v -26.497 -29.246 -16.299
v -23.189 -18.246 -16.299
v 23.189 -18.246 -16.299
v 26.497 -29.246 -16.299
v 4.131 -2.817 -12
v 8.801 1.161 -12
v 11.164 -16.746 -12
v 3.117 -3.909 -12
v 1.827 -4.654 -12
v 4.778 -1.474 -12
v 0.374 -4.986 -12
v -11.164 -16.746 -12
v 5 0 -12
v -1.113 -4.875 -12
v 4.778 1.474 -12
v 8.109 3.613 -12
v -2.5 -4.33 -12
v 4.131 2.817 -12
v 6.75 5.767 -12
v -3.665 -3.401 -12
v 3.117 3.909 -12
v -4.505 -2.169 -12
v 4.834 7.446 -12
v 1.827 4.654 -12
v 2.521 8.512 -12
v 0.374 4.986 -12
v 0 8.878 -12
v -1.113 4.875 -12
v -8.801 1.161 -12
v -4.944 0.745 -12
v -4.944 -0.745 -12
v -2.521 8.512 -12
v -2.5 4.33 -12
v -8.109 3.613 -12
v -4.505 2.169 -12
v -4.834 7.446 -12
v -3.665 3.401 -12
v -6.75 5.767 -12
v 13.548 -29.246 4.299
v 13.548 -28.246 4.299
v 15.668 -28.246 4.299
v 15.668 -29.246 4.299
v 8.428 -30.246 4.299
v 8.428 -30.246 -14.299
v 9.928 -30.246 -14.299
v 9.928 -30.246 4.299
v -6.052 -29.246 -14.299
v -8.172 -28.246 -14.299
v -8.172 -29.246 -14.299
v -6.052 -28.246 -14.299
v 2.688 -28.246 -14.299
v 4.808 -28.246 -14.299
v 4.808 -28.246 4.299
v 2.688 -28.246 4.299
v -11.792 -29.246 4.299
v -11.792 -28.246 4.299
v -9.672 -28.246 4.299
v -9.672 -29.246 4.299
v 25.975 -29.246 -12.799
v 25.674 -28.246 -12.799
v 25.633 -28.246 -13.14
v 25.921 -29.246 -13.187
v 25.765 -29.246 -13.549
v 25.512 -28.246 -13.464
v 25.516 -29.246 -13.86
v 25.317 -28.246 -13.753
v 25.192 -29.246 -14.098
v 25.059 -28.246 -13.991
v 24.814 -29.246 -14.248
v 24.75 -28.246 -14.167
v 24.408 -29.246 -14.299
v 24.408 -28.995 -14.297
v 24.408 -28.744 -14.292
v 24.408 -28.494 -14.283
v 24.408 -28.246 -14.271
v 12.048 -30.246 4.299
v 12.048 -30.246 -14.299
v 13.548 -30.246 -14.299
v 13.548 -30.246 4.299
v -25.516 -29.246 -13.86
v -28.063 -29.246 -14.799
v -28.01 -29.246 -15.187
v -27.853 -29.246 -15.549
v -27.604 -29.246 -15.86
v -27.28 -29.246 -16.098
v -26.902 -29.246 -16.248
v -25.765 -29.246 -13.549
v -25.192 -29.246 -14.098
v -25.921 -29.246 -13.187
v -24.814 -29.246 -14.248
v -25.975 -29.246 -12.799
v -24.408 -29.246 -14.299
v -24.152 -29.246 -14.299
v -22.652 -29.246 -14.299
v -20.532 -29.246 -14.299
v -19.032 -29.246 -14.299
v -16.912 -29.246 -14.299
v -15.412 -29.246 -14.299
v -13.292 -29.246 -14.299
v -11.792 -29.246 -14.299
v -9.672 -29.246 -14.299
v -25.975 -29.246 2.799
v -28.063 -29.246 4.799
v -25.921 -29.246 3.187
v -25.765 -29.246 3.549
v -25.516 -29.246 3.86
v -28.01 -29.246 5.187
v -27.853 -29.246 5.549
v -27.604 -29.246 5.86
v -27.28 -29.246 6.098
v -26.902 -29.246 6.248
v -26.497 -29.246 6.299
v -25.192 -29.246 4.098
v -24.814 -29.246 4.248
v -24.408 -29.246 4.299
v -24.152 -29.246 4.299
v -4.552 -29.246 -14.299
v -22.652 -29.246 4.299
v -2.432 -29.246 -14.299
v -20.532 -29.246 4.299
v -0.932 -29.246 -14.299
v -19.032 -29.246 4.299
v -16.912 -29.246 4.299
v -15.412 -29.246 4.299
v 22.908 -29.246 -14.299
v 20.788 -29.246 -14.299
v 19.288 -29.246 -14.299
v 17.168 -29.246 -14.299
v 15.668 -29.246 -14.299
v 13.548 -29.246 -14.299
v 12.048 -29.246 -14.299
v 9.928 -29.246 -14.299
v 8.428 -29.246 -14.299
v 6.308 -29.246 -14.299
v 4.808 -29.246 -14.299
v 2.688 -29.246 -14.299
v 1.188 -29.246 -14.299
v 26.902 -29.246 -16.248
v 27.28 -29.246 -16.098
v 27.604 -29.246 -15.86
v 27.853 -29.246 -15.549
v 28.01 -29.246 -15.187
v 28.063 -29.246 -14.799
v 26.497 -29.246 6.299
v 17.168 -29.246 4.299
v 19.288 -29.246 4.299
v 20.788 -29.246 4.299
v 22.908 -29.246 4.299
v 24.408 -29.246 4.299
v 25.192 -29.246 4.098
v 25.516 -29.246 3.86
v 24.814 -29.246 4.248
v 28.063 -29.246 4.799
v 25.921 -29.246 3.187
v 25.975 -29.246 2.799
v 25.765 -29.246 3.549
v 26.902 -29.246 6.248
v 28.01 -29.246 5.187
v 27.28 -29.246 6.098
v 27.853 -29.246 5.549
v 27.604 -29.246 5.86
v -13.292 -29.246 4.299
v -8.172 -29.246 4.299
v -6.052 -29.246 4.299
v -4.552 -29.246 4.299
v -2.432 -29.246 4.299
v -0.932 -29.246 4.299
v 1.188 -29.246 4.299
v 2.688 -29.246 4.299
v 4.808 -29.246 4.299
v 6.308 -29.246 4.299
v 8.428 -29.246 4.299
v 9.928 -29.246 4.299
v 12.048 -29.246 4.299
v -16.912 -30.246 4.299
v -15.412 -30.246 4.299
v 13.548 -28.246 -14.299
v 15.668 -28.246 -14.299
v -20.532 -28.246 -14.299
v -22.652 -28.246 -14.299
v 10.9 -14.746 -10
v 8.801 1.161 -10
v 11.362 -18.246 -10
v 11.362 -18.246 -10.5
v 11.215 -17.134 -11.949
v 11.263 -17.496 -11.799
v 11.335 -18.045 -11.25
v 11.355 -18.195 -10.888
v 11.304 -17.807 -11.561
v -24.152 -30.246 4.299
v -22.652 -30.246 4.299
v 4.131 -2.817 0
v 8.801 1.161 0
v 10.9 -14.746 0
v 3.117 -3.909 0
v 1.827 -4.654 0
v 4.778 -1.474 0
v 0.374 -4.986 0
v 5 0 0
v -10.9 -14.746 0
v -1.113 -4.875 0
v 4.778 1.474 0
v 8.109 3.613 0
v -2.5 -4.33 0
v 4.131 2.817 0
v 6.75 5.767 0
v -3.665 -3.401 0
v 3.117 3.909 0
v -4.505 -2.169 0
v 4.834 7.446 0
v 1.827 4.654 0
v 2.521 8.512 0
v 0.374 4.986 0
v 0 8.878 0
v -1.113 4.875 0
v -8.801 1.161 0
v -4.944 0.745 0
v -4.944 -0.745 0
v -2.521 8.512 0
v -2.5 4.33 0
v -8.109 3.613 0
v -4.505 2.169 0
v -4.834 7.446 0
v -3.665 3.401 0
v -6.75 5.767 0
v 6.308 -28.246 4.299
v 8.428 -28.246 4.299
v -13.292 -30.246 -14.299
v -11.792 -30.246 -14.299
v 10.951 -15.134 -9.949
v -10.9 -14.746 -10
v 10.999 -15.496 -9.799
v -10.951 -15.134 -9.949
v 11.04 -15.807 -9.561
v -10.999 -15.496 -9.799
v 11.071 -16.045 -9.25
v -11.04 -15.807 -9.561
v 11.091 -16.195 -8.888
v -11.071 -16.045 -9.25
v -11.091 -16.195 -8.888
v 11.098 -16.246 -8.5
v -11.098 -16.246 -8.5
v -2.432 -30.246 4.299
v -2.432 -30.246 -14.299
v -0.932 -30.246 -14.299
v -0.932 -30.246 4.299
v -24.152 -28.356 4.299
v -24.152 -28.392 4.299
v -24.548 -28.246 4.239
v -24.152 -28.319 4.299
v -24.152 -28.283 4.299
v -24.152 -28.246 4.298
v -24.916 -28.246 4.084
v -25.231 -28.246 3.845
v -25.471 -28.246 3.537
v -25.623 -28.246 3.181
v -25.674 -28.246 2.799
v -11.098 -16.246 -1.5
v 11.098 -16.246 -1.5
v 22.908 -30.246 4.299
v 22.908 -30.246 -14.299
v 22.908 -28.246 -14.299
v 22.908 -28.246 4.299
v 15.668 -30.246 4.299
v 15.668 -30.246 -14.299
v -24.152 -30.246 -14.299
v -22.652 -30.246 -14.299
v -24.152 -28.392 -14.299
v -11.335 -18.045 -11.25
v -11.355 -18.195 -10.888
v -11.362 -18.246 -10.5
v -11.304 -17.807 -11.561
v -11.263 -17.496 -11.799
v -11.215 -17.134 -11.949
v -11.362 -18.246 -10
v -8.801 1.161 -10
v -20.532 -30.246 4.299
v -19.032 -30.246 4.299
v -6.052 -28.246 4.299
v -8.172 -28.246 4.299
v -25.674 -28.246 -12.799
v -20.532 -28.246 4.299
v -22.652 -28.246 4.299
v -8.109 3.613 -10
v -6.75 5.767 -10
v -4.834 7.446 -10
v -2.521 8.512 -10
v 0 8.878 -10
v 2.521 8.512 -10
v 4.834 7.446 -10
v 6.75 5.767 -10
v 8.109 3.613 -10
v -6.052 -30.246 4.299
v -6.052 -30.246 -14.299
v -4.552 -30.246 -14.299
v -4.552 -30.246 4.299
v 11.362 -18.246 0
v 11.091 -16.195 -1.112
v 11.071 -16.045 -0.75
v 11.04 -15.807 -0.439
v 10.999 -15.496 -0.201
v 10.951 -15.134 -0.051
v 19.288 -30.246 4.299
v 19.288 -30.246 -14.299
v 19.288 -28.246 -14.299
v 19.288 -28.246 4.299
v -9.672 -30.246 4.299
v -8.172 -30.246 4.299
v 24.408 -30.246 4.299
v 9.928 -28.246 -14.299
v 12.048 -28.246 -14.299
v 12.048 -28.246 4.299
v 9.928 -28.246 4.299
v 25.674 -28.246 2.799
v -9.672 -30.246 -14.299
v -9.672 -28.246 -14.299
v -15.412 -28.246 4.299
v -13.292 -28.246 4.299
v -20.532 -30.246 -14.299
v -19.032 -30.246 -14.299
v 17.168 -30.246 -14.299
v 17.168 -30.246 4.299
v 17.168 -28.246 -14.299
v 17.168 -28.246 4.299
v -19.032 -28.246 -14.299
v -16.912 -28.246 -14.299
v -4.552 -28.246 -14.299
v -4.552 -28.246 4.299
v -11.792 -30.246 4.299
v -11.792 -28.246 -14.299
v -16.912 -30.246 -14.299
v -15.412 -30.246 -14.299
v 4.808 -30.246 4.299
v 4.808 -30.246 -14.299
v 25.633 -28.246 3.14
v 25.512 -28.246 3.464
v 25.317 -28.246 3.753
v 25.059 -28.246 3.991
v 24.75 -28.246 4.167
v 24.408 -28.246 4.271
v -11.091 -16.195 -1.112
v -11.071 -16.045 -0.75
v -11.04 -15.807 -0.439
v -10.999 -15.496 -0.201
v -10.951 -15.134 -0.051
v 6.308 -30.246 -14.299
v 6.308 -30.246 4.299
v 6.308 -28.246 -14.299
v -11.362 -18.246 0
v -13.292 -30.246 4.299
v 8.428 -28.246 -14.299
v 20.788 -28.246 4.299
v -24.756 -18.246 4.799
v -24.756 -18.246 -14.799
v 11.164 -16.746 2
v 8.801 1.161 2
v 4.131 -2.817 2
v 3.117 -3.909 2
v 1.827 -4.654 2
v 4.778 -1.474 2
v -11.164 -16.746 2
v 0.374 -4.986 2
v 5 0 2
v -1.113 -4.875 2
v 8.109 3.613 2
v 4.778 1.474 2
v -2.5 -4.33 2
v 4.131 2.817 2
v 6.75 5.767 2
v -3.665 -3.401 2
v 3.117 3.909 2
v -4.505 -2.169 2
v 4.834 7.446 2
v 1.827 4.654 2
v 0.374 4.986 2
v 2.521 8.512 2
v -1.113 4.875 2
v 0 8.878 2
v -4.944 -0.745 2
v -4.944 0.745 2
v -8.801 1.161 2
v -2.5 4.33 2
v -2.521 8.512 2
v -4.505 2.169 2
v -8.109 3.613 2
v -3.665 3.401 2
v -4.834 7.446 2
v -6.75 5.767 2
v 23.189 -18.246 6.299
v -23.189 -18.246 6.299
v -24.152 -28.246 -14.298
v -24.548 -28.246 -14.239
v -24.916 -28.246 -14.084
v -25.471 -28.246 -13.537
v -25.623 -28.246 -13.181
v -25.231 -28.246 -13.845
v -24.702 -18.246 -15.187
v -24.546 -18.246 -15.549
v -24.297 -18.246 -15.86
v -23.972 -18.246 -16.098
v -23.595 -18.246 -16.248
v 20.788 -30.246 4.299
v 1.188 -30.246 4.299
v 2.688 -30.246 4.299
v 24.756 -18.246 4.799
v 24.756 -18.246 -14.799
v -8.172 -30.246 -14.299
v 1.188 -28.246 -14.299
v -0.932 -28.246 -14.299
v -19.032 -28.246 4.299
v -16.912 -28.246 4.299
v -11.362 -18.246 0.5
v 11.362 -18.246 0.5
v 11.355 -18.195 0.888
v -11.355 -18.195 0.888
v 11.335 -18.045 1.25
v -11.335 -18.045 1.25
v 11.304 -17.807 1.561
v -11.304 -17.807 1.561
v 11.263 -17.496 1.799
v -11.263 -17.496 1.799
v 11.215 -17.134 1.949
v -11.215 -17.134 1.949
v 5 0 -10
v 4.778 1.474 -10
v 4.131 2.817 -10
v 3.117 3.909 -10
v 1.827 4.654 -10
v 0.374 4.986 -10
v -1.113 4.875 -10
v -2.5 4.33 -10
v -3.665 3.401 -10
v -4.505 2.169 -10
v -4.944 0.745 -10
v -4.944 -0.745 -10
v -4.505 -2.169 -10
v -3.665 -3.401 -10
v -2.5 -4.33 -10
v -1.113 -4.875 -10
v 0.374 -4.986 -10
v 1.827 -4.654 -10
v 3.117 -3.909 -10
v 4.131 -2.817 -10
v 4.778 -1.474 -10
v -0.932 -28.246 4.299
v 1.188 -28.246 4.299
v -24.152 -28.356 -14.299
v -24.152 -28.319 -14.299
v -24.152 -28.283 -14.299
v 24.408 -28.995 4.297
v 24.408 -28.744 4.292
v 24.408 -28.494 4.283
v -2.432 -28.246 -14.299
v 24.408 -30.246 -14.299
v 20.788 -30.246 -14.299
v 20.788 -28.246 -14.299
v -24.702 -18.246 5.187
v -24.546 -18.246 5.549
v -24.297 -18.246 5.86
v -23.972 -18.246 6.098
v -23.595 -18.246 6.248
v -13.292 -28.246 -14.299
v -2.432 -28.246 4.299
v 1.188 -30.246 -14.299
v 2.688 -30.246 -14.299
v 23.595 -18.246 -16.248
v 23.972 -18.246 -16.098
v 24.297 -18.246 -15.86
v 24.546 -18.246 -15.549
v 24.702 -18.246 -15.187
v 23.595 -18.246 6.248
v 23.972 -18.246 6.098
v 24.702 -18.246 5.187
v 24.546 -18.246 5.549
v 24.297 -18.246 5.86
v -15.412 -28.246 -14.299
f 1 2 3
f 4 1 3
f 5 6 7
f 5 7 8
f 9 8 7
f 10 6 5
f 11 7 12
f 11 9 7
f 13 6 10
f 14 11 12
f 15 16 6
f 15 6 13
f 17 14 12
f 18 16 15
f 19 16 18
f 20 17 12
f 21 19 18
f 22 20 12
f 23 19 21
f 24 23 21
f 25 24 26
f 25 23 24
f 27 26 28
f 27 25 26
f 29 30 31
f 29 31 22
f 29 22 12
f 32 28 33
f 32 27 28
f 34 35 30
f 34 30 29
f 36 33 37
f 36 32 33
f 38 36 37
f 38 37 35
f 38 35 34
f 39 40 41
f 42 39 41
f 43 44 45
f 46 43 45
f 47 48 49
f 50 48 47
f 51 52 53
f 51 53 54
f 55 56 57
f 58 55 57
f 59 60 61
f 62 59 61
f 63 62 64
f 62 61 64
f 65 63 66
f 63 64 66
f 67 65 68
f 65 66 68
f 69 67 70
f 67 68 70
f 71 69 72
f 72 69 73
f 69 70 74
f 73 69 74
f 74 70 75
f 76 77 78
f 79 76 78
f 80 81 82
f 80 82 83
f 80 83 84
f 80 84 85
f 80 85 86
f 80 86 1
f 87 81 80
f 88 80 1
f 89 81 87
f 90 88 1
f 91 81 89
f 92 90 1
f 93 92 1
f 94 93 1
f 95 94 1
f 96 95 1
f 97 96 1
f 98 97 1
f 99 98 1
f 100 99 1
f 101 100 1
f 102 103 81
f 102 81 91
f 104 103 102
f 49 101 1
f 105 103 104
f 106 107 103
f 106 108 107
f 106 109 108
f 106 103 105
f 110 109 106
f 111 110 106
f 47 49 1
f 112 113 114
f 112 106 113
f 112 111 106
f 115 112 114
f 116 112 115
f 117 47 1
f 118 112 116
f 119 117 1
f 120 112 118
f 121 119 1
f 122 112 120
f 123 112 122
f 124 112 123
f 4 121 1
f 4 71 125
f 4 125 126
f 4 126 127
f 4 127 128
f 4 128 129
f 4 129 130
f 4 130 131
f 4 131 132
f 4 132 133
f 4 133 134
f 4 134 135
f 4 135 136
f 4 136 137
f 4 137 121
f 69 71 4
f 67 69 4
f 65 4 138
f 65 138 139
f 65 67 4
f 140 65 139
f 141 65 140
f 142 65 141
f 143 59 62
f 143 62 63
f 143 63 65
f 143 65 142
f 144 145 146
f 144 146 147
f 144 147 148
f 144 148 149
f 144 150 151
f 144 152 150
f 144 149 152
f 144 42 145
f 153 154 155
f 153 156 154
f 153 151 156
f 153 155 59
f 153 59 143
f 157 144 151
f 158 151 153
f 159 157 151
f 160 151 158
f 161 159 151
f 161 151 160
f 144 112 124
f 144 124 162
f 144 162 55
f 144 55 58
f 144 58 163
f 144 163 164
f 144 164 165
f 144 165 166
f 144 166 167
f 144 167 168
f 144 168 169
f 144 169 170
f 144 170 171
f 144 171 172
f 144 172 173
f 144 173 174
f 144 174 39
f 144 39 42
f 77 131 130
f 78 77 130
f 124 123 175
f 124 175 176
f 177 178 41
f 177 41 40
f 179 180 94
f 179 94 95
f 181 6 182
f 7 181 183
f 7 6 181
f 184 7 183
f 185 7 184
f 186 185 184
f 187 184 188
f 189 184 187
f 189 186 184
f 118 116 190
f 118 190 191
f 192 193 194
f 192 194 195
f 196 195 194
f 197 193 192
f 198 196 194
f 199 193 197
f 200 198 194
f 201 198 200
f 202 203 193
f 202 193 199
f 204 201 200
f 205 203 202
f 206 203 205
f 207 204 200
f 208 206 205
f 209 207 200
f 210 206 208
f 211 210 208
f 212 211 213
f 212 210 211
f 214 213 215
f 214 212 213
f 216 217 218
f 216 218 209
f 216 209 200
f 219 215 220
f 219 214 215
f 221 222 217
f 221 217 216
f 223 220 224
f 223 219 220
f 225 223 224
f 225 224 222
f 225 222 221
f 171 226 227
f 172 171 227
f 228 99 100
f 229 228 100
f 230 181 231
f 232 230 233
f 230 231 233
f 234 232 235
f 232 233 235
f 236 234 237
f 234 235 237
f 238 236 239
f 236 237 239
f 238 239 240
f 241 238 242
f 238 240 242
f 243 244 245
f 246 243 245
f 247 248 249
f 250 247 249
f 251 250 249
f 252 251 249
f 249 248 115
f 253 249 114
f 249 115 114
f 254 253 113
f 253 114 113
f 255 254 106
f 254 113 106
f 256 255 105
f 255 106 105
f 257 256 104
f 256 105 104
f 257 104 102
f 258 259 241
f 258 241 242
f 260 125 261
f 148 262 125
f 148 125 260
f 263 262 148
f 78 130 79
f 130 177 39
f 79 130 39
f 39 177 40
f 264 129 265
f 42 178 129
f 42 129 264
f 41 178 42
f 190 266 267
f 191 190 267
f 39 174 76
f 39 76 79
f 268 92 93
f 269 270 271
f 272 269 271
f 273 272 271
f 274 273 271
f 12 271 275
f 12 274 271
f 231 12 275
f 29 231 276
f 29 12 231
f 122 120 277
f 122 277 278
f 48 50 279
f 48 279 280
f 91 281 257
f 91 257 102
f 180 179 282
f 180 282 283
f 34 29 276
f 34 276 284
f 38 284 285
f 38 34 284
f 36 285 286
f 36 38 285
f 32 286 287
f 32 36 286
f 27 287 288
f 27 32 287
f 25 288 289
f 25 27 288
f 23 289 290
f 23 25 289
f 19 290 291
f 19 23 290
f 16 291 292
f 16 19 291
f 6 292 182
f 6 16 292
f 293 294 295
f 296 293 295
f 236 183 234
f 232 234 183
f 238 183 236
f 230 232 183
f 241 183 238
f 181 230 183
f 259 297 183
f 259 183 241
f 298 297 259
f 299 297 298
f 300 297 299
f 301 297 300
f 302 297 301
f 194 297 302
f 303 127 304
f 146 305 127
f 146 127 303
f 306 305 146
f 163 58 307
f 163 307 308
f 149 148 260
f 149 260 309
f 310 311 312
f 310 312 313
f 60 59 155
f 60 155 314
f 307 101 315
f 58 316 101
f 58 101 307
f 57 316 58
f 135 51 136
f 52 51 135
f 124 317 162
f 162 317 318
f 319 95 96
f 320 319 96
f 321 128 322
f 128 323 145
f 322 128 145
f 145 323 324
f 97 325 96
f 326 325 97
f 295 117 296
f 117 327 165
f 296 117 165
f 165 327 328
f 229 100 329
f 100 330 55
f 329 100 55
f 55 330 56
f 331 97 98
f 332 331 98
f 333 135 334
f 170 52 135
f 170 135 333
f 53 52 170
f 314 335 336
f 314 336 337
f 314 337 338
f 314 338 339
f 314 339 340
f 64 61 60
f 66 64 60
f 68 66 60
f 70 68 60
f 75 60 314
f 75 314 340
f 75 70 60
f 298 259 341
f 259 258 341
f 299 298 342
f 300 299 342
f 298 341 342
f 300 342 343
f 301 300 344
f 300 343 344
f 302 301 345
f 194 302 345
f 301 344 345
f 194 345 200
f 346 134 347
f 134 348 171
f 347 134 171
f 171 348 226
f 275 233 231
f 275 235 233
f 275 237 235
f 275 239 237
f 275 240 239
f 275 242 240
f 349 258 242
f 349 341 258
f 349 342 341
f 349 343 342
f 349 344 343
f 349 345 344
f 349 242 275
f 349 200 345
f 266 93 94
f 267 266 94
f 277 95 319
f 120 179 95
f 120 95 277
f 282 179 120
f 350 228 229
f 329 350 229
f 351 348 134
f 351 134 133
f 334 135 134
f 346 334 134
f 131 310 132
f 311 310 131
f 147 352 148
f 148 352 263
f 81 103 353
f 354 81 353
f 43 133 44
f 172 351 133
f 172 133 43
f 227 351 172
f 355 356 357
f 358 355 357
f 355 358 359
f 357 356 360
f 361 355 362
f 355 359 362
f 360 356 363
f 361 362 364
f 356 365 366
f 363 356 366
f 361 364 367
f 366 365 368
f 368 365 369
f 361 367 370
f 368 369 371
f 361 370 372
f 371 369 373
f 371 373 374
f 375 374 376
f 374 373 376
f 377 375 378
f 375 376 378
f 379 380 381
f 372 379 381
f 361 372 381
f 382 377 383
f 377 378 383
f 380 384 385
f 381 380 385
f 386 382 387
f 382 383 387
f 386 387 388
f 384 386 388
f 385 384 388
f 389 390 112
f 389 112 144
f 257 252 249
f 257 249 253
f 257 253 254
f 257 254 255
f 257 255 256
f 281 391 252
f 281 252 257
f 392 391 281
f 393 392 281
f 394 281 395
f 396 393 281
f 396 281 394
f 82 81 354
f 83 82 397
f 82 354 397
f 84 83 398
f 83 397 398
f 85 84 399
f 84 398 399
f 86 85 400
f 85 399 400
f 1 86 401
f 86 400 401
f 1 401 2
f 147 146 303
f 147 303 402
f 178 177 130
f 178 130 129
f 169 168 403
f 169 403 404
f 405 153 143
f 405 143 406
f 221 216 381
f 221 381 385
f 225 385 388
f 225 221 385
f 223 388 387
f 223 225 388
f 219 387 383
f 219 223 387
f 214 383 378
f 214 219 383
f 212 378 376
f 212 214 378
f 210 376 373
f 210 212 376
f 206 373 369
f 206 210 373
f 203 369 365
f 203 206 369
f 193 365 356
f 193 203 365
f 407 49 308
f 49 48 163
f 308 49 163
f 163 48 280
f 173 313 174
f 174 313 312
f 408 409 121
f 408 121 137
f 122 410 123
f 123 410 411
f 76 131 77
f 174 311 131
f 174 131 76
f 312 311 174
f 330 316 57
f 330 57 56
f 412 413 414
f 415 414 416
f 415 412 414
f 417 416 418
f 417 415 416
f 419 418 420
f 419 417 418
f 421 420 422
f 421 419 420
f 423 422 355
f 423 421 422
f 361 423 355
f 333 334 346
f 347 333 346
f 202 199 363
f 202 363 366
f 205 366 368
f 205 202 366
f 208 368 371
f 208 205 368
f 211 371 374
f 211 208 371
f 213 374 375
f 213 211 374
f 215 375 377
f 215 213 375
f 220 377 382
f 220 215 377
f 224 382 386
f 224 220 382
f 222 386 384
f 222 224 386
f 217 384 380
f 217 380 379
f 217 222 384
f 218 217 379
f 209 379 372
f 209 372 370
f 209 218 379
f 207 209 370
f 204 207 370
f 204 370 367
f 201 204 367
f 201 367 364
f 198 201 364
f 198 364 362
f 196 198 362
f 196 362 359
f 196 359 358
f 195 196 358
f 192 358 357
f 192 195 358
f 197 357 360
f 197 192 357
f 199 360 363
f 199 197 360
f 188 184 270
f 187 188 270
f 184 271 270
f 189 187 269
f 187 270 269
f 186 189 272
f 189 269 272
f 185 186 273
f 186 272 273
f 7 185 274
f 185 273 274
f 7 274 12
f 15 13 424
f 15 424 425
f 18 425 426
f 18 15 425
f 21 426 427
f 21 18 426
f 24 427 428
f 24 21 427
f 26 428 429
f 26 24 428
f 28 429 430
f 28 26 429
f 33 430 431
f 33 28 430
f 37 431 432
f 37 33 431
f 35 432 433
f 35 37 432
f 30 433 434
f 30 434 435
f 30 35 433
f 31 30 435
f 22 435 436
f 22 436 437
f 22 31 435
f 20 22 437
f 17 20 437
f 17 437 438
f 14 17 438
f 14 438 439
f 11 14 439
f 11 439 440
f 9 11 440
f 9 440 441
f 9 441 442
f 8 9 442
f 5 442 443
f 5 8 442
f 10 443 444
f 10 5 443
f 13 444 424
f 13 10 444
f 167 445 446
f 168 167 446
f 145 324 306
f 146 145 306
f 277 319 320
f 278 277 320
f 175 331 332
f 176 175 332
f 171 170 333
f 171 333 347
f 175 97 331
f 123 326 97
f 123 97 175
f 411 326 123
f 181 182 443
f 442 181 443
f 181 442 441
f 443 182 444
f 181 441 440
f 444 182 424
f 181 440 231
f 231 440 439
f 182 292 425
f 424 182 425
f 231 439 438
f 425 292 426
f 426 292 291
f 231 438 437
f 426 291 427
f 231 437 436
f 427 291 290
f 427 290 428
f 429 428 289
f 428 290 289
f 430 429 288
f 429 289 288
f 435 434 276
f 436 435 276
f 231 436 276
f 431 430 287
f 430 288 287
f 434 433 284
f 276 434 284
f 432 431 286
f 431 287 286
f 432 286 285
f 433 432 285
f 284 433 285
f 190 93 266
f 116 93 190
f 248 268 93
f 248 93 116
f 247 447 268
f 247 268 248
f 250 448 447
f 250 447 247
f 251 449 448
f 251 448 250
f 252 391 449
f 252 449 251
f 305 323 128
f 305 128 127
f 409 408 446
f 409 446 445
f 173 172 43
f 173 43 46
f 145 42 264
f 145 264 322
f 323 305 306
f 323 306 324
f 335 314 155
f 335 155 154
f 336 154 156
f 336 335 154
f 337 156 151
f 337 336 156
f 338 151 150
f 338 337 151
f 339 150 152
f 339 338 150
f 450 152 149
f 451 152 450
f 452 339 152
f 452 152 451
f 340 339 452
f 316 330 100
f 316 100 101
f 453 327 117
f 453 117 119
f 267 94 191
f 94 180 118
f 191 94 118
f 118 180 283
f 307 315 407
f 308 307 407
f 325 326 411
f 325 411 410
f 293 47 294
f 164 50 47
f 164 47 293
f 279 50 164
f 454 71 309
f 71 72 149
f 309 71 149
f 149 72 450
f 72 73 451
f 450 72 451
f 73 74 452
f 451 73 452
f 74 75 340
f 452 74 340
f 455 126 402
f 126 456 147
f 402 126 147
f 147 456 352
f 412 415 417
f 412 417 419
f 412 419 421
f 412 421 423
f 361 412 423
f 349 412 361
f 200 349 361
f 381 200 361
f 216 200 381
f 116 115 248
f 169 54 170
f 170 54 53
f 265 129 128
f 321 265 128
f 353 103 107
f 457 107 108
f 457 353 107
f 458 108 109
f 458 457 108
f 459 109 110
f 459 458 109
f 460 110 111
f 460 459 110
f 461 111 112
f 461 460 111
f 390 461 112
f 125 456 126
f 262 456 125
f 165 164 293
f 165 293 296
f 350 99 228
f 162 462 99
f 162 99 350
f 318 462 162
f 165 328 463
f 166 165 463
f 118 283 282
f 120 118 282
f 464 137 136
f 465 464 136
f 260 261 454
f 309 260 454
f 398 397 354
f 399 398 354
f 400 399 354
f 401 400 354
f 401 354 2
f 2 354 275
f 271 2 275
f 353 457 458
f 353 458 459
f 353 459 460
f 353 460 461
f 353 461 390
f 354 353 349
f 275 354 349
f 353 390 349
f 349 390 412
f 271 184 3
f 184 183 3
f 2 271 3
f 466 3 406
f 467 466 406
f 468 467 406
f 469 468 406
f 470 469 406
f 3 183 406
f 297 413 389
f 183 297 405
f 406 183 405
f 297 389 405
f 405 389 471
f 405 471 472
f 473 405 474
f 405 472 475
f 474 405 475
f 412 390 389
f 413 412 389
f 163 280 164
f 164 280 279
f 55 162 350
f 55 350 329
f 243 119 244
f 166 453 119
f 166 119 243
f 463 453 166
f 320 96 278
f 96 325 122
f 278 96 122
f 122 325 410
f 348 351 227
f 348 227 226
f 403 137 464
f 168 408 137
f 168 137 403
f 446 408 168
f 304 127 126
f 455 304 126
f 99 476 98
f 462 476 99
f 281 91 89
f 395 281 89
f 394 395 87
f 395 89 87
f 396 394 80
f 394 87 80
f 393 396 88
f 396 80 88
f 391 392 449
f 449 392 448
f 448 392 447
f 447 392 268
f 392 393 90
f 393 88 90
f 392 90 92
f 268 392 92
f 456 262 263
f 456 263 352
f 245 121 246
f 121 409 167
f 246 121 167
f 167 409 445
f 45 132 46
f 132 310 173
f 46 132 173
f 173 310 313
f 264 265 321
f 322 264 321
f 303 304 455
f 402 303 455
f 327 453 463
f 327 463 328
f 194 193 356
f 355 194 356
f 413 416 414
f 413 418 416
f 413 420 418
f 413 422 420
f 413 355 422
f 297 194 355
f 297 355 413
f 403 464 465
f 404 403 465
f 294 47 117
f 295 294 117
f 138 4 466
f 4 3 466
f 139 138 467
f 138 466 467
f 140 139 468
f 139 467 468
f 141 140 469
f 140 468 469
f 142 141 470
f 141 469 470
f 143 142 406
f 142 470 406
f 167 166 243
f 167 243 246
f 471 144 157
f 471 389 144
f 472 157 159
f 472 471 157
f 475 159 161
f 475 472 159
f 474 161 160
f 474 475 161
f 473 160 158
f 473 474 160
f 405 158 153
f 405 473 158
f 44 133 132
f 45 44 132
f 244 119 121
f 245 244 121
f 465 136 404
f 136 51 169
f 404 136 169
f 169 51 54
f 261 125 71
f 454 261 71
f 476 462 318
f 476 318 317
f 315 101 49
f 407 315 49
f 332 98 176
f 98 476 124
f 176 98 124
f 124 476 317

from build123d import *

# Parameters (mm, degrees)
SKETCH1_R           = 5
BOSS_EXTRUDE1_DEPTH = 2
BOSS_EXTRUDE2_DEPTH = 10
LPATTERN1_COUNT     = 2
LPATTERN1_PITCH     = 12
FILLET1_R           = 1.5
SKETCH3_W           = 56.126339002
SKETCH3_H           = 22.59818153
BOSS_EXTRUDE3_DEPTH = 11
CUT_EXTRUDE1_DEPTH  = 47.406488284
SHELL1_START        = -14.299090765
SHELL1_DEPTH        = 18.59818153
FILLET2_R           = 1.5
SKETCH6_W           = 1.5
SKETCH6_H           = 18.59818153
BOSS_EXTRUDE4_DEPTH = 2


# Read off the part's stored shape, not the designer's step: Shell1
with BuildPart() as part:
    # Sketch1 → Boss-Extrude1 (new body)
    with BuildSketch(Plane.XY):
        with BuildLine():
            Line((-11.361776574, -18.246245298), (-8.801388784, 1.161153468))
            ThreePointArc((-8.801388784, 1.161153468), (0, 8.87765295), (8.801388784, 1.161153468))
            Line((8.801388784, 1.161153468), (11.361776574, -18.246245298))
            Line((11.361776574, -18.246245298), (-11.361776574, -18.246245298))
        make_face()
        Circle(SKETCH1_R, mode=Mode.SUBTRACT)
    boss_extrude1 = extrude(amount=BOSS_EXTRUDE1_DEPTH)

    # Sketch2 → Boss-Extrude2 (add)
    with BuildSketch(Plane(origin=(0, 0, 0), x_dir=(-1, 0, 0), z_dir=(0, 0, -1))):
        Polygon((-11.0979197, -16.246245298), (11.0979197, -16.246245298), (11.361776574, -18.246245298), (-11.361776574, -18.246245298), align=None)
    extrude(amount=BOSS_EXTRUDE2_DEPTH)

    # LPattern1: Boss-Extrude1 ×2
    with Locations(*[(0, 0, -i * LPATTERN1_PITCH) for i in range(1, LPATTERN1_COUNT)]):
        add(boss_extrude1)

    # Fillet1
    fillet1_edges = [part.edges().sort_by_distance(p)[0] for p in [
        (0, -18.246245298, -12),
        (0, -16.246245298, 0),
        (0, -16.246245298, -10),
        (0, -18.246245298, 2),
    ]]
    fillet(fillet1_edges, radius=FILLET1_R)

    # Sketch3 → Boss-Extrude3 (add)
    with BuildSketch(Plane.XZ.offset(18.246245298)):
        with Locations((0, -5)):
            Rectangle(SKETCH3_W, SKETCH3_H)
    extrude(amount=BOSS_EXTRUDE3_DEPTH)

    # Sketch5 → Cut-Extrude1 (cut, through all)
    with BuildSketch(Plane.XY.offset(6.299090765)):
        Polygon((-28.063169501, -29.246245298), (-24.755567795, -18.246245298), (-28.063169501, -18.246245298), align=None)
        Polygon((28.063169501, -18.246245298), (28.063169501, -29.246245298), (24.755567795, -18.246245298), align=None)
    extrude(amount=-CUT_EXTRUDE1_DEPTH, mode=Mode.SUBTRACT)

    # Shell1 outline → Shell1 (cut)
    with BuildSketch(Plane.XY.offset(SHELL1_START)):
        Polygon((25.974710628, -29.246245298), (25.674019564, -28.246245298), (-25.674019564, -28.246245298), (-25.974710628, -29.246245298), align=None)
    extrude(amount=SHELL1_DEPTH, mode=Mode.SUBTRACT)

    # Fillet2
    fillet2_edges = [part.edges().sort_by_distance(p)[0] for p in [
        (26.409368648, -23.746245298, -16.299090765),
        (26.409368648, -23.746245298, 6.299090765),
        (25.824365096, -28.746245298, -14.299090765),
        (-25.824365096, -28.746245298, -14.299090765),
        (-25.824365096, -28.746245298, 4.299090765),
        (25.824365096, -28.746245298, 4.299090765),
        (-26.409368648, -23.746245298, -16.299090765),
        (-26.409368648, -23.746245298, 6.299090765),
    ]]
    fillet(fillet2_edges, radius=FILLET2_R)

    # Sketch6 → Boss-Extrude4 (add)
    with BuildSketch(Plane.XZ.offset(28.246245298)):
        with Locations((23.658366473, -5)):
            Rectangle(SKETCH6_W, SKETCH6_H)
        with Locations((20.038366473, -5)):
            Rectangle(SKETCH6_W, SKETCH6_H)
        with Locations((16.418366473, -5)):
            Rectangle(SKETCH6_W, SKETCH6_H)
        with Locations((12.798366473, -5)):
            Rectangle(SKETCH6_W, SKETCH6_H)
        with Locations((9.178366473, -5)):
            Rectangle(SKETCH6_W, SKETCH6_H)
        with Locations((5.558366473, -5)):
            Rectangle(SKETCH6_W, SKETCH6_H)
        with Locations((1.938366473, -5)):
            Rectangle(SKETCH6_W, SKETCH6_H)
        with Locations((-1.681633527, -5)):
            Rectangle(SKETCH6_W, SKETCH6_H)
        with Locations((-5.301633527, -5)):
            Rectangle(SKETCH6_W, SKETCH6_H)
        with Locations((-8.921633527, -5)):
            Rectangle(SKETCH6_W, SKETCH6_H)
        with Locations((-12.541633527, -5)):
            Rectangle(SKETCH6_W, SKETCH6_H)
        with Locations((-16.161633527, -5)):
            Rectangle(SKETCH6_W, SKETCH6_H)
        with Locations((-19.781633527, -5)):
            Rectangle(SKETCH6_W, SKETCH6_H)
        with Locations((-23.401633527, -5)):
            Rectangle(SKETCH6_W, SKETCH6_H)
    extrude(amount=BOSS_EXTRUDE4_DEPTH)


solid = part.part
